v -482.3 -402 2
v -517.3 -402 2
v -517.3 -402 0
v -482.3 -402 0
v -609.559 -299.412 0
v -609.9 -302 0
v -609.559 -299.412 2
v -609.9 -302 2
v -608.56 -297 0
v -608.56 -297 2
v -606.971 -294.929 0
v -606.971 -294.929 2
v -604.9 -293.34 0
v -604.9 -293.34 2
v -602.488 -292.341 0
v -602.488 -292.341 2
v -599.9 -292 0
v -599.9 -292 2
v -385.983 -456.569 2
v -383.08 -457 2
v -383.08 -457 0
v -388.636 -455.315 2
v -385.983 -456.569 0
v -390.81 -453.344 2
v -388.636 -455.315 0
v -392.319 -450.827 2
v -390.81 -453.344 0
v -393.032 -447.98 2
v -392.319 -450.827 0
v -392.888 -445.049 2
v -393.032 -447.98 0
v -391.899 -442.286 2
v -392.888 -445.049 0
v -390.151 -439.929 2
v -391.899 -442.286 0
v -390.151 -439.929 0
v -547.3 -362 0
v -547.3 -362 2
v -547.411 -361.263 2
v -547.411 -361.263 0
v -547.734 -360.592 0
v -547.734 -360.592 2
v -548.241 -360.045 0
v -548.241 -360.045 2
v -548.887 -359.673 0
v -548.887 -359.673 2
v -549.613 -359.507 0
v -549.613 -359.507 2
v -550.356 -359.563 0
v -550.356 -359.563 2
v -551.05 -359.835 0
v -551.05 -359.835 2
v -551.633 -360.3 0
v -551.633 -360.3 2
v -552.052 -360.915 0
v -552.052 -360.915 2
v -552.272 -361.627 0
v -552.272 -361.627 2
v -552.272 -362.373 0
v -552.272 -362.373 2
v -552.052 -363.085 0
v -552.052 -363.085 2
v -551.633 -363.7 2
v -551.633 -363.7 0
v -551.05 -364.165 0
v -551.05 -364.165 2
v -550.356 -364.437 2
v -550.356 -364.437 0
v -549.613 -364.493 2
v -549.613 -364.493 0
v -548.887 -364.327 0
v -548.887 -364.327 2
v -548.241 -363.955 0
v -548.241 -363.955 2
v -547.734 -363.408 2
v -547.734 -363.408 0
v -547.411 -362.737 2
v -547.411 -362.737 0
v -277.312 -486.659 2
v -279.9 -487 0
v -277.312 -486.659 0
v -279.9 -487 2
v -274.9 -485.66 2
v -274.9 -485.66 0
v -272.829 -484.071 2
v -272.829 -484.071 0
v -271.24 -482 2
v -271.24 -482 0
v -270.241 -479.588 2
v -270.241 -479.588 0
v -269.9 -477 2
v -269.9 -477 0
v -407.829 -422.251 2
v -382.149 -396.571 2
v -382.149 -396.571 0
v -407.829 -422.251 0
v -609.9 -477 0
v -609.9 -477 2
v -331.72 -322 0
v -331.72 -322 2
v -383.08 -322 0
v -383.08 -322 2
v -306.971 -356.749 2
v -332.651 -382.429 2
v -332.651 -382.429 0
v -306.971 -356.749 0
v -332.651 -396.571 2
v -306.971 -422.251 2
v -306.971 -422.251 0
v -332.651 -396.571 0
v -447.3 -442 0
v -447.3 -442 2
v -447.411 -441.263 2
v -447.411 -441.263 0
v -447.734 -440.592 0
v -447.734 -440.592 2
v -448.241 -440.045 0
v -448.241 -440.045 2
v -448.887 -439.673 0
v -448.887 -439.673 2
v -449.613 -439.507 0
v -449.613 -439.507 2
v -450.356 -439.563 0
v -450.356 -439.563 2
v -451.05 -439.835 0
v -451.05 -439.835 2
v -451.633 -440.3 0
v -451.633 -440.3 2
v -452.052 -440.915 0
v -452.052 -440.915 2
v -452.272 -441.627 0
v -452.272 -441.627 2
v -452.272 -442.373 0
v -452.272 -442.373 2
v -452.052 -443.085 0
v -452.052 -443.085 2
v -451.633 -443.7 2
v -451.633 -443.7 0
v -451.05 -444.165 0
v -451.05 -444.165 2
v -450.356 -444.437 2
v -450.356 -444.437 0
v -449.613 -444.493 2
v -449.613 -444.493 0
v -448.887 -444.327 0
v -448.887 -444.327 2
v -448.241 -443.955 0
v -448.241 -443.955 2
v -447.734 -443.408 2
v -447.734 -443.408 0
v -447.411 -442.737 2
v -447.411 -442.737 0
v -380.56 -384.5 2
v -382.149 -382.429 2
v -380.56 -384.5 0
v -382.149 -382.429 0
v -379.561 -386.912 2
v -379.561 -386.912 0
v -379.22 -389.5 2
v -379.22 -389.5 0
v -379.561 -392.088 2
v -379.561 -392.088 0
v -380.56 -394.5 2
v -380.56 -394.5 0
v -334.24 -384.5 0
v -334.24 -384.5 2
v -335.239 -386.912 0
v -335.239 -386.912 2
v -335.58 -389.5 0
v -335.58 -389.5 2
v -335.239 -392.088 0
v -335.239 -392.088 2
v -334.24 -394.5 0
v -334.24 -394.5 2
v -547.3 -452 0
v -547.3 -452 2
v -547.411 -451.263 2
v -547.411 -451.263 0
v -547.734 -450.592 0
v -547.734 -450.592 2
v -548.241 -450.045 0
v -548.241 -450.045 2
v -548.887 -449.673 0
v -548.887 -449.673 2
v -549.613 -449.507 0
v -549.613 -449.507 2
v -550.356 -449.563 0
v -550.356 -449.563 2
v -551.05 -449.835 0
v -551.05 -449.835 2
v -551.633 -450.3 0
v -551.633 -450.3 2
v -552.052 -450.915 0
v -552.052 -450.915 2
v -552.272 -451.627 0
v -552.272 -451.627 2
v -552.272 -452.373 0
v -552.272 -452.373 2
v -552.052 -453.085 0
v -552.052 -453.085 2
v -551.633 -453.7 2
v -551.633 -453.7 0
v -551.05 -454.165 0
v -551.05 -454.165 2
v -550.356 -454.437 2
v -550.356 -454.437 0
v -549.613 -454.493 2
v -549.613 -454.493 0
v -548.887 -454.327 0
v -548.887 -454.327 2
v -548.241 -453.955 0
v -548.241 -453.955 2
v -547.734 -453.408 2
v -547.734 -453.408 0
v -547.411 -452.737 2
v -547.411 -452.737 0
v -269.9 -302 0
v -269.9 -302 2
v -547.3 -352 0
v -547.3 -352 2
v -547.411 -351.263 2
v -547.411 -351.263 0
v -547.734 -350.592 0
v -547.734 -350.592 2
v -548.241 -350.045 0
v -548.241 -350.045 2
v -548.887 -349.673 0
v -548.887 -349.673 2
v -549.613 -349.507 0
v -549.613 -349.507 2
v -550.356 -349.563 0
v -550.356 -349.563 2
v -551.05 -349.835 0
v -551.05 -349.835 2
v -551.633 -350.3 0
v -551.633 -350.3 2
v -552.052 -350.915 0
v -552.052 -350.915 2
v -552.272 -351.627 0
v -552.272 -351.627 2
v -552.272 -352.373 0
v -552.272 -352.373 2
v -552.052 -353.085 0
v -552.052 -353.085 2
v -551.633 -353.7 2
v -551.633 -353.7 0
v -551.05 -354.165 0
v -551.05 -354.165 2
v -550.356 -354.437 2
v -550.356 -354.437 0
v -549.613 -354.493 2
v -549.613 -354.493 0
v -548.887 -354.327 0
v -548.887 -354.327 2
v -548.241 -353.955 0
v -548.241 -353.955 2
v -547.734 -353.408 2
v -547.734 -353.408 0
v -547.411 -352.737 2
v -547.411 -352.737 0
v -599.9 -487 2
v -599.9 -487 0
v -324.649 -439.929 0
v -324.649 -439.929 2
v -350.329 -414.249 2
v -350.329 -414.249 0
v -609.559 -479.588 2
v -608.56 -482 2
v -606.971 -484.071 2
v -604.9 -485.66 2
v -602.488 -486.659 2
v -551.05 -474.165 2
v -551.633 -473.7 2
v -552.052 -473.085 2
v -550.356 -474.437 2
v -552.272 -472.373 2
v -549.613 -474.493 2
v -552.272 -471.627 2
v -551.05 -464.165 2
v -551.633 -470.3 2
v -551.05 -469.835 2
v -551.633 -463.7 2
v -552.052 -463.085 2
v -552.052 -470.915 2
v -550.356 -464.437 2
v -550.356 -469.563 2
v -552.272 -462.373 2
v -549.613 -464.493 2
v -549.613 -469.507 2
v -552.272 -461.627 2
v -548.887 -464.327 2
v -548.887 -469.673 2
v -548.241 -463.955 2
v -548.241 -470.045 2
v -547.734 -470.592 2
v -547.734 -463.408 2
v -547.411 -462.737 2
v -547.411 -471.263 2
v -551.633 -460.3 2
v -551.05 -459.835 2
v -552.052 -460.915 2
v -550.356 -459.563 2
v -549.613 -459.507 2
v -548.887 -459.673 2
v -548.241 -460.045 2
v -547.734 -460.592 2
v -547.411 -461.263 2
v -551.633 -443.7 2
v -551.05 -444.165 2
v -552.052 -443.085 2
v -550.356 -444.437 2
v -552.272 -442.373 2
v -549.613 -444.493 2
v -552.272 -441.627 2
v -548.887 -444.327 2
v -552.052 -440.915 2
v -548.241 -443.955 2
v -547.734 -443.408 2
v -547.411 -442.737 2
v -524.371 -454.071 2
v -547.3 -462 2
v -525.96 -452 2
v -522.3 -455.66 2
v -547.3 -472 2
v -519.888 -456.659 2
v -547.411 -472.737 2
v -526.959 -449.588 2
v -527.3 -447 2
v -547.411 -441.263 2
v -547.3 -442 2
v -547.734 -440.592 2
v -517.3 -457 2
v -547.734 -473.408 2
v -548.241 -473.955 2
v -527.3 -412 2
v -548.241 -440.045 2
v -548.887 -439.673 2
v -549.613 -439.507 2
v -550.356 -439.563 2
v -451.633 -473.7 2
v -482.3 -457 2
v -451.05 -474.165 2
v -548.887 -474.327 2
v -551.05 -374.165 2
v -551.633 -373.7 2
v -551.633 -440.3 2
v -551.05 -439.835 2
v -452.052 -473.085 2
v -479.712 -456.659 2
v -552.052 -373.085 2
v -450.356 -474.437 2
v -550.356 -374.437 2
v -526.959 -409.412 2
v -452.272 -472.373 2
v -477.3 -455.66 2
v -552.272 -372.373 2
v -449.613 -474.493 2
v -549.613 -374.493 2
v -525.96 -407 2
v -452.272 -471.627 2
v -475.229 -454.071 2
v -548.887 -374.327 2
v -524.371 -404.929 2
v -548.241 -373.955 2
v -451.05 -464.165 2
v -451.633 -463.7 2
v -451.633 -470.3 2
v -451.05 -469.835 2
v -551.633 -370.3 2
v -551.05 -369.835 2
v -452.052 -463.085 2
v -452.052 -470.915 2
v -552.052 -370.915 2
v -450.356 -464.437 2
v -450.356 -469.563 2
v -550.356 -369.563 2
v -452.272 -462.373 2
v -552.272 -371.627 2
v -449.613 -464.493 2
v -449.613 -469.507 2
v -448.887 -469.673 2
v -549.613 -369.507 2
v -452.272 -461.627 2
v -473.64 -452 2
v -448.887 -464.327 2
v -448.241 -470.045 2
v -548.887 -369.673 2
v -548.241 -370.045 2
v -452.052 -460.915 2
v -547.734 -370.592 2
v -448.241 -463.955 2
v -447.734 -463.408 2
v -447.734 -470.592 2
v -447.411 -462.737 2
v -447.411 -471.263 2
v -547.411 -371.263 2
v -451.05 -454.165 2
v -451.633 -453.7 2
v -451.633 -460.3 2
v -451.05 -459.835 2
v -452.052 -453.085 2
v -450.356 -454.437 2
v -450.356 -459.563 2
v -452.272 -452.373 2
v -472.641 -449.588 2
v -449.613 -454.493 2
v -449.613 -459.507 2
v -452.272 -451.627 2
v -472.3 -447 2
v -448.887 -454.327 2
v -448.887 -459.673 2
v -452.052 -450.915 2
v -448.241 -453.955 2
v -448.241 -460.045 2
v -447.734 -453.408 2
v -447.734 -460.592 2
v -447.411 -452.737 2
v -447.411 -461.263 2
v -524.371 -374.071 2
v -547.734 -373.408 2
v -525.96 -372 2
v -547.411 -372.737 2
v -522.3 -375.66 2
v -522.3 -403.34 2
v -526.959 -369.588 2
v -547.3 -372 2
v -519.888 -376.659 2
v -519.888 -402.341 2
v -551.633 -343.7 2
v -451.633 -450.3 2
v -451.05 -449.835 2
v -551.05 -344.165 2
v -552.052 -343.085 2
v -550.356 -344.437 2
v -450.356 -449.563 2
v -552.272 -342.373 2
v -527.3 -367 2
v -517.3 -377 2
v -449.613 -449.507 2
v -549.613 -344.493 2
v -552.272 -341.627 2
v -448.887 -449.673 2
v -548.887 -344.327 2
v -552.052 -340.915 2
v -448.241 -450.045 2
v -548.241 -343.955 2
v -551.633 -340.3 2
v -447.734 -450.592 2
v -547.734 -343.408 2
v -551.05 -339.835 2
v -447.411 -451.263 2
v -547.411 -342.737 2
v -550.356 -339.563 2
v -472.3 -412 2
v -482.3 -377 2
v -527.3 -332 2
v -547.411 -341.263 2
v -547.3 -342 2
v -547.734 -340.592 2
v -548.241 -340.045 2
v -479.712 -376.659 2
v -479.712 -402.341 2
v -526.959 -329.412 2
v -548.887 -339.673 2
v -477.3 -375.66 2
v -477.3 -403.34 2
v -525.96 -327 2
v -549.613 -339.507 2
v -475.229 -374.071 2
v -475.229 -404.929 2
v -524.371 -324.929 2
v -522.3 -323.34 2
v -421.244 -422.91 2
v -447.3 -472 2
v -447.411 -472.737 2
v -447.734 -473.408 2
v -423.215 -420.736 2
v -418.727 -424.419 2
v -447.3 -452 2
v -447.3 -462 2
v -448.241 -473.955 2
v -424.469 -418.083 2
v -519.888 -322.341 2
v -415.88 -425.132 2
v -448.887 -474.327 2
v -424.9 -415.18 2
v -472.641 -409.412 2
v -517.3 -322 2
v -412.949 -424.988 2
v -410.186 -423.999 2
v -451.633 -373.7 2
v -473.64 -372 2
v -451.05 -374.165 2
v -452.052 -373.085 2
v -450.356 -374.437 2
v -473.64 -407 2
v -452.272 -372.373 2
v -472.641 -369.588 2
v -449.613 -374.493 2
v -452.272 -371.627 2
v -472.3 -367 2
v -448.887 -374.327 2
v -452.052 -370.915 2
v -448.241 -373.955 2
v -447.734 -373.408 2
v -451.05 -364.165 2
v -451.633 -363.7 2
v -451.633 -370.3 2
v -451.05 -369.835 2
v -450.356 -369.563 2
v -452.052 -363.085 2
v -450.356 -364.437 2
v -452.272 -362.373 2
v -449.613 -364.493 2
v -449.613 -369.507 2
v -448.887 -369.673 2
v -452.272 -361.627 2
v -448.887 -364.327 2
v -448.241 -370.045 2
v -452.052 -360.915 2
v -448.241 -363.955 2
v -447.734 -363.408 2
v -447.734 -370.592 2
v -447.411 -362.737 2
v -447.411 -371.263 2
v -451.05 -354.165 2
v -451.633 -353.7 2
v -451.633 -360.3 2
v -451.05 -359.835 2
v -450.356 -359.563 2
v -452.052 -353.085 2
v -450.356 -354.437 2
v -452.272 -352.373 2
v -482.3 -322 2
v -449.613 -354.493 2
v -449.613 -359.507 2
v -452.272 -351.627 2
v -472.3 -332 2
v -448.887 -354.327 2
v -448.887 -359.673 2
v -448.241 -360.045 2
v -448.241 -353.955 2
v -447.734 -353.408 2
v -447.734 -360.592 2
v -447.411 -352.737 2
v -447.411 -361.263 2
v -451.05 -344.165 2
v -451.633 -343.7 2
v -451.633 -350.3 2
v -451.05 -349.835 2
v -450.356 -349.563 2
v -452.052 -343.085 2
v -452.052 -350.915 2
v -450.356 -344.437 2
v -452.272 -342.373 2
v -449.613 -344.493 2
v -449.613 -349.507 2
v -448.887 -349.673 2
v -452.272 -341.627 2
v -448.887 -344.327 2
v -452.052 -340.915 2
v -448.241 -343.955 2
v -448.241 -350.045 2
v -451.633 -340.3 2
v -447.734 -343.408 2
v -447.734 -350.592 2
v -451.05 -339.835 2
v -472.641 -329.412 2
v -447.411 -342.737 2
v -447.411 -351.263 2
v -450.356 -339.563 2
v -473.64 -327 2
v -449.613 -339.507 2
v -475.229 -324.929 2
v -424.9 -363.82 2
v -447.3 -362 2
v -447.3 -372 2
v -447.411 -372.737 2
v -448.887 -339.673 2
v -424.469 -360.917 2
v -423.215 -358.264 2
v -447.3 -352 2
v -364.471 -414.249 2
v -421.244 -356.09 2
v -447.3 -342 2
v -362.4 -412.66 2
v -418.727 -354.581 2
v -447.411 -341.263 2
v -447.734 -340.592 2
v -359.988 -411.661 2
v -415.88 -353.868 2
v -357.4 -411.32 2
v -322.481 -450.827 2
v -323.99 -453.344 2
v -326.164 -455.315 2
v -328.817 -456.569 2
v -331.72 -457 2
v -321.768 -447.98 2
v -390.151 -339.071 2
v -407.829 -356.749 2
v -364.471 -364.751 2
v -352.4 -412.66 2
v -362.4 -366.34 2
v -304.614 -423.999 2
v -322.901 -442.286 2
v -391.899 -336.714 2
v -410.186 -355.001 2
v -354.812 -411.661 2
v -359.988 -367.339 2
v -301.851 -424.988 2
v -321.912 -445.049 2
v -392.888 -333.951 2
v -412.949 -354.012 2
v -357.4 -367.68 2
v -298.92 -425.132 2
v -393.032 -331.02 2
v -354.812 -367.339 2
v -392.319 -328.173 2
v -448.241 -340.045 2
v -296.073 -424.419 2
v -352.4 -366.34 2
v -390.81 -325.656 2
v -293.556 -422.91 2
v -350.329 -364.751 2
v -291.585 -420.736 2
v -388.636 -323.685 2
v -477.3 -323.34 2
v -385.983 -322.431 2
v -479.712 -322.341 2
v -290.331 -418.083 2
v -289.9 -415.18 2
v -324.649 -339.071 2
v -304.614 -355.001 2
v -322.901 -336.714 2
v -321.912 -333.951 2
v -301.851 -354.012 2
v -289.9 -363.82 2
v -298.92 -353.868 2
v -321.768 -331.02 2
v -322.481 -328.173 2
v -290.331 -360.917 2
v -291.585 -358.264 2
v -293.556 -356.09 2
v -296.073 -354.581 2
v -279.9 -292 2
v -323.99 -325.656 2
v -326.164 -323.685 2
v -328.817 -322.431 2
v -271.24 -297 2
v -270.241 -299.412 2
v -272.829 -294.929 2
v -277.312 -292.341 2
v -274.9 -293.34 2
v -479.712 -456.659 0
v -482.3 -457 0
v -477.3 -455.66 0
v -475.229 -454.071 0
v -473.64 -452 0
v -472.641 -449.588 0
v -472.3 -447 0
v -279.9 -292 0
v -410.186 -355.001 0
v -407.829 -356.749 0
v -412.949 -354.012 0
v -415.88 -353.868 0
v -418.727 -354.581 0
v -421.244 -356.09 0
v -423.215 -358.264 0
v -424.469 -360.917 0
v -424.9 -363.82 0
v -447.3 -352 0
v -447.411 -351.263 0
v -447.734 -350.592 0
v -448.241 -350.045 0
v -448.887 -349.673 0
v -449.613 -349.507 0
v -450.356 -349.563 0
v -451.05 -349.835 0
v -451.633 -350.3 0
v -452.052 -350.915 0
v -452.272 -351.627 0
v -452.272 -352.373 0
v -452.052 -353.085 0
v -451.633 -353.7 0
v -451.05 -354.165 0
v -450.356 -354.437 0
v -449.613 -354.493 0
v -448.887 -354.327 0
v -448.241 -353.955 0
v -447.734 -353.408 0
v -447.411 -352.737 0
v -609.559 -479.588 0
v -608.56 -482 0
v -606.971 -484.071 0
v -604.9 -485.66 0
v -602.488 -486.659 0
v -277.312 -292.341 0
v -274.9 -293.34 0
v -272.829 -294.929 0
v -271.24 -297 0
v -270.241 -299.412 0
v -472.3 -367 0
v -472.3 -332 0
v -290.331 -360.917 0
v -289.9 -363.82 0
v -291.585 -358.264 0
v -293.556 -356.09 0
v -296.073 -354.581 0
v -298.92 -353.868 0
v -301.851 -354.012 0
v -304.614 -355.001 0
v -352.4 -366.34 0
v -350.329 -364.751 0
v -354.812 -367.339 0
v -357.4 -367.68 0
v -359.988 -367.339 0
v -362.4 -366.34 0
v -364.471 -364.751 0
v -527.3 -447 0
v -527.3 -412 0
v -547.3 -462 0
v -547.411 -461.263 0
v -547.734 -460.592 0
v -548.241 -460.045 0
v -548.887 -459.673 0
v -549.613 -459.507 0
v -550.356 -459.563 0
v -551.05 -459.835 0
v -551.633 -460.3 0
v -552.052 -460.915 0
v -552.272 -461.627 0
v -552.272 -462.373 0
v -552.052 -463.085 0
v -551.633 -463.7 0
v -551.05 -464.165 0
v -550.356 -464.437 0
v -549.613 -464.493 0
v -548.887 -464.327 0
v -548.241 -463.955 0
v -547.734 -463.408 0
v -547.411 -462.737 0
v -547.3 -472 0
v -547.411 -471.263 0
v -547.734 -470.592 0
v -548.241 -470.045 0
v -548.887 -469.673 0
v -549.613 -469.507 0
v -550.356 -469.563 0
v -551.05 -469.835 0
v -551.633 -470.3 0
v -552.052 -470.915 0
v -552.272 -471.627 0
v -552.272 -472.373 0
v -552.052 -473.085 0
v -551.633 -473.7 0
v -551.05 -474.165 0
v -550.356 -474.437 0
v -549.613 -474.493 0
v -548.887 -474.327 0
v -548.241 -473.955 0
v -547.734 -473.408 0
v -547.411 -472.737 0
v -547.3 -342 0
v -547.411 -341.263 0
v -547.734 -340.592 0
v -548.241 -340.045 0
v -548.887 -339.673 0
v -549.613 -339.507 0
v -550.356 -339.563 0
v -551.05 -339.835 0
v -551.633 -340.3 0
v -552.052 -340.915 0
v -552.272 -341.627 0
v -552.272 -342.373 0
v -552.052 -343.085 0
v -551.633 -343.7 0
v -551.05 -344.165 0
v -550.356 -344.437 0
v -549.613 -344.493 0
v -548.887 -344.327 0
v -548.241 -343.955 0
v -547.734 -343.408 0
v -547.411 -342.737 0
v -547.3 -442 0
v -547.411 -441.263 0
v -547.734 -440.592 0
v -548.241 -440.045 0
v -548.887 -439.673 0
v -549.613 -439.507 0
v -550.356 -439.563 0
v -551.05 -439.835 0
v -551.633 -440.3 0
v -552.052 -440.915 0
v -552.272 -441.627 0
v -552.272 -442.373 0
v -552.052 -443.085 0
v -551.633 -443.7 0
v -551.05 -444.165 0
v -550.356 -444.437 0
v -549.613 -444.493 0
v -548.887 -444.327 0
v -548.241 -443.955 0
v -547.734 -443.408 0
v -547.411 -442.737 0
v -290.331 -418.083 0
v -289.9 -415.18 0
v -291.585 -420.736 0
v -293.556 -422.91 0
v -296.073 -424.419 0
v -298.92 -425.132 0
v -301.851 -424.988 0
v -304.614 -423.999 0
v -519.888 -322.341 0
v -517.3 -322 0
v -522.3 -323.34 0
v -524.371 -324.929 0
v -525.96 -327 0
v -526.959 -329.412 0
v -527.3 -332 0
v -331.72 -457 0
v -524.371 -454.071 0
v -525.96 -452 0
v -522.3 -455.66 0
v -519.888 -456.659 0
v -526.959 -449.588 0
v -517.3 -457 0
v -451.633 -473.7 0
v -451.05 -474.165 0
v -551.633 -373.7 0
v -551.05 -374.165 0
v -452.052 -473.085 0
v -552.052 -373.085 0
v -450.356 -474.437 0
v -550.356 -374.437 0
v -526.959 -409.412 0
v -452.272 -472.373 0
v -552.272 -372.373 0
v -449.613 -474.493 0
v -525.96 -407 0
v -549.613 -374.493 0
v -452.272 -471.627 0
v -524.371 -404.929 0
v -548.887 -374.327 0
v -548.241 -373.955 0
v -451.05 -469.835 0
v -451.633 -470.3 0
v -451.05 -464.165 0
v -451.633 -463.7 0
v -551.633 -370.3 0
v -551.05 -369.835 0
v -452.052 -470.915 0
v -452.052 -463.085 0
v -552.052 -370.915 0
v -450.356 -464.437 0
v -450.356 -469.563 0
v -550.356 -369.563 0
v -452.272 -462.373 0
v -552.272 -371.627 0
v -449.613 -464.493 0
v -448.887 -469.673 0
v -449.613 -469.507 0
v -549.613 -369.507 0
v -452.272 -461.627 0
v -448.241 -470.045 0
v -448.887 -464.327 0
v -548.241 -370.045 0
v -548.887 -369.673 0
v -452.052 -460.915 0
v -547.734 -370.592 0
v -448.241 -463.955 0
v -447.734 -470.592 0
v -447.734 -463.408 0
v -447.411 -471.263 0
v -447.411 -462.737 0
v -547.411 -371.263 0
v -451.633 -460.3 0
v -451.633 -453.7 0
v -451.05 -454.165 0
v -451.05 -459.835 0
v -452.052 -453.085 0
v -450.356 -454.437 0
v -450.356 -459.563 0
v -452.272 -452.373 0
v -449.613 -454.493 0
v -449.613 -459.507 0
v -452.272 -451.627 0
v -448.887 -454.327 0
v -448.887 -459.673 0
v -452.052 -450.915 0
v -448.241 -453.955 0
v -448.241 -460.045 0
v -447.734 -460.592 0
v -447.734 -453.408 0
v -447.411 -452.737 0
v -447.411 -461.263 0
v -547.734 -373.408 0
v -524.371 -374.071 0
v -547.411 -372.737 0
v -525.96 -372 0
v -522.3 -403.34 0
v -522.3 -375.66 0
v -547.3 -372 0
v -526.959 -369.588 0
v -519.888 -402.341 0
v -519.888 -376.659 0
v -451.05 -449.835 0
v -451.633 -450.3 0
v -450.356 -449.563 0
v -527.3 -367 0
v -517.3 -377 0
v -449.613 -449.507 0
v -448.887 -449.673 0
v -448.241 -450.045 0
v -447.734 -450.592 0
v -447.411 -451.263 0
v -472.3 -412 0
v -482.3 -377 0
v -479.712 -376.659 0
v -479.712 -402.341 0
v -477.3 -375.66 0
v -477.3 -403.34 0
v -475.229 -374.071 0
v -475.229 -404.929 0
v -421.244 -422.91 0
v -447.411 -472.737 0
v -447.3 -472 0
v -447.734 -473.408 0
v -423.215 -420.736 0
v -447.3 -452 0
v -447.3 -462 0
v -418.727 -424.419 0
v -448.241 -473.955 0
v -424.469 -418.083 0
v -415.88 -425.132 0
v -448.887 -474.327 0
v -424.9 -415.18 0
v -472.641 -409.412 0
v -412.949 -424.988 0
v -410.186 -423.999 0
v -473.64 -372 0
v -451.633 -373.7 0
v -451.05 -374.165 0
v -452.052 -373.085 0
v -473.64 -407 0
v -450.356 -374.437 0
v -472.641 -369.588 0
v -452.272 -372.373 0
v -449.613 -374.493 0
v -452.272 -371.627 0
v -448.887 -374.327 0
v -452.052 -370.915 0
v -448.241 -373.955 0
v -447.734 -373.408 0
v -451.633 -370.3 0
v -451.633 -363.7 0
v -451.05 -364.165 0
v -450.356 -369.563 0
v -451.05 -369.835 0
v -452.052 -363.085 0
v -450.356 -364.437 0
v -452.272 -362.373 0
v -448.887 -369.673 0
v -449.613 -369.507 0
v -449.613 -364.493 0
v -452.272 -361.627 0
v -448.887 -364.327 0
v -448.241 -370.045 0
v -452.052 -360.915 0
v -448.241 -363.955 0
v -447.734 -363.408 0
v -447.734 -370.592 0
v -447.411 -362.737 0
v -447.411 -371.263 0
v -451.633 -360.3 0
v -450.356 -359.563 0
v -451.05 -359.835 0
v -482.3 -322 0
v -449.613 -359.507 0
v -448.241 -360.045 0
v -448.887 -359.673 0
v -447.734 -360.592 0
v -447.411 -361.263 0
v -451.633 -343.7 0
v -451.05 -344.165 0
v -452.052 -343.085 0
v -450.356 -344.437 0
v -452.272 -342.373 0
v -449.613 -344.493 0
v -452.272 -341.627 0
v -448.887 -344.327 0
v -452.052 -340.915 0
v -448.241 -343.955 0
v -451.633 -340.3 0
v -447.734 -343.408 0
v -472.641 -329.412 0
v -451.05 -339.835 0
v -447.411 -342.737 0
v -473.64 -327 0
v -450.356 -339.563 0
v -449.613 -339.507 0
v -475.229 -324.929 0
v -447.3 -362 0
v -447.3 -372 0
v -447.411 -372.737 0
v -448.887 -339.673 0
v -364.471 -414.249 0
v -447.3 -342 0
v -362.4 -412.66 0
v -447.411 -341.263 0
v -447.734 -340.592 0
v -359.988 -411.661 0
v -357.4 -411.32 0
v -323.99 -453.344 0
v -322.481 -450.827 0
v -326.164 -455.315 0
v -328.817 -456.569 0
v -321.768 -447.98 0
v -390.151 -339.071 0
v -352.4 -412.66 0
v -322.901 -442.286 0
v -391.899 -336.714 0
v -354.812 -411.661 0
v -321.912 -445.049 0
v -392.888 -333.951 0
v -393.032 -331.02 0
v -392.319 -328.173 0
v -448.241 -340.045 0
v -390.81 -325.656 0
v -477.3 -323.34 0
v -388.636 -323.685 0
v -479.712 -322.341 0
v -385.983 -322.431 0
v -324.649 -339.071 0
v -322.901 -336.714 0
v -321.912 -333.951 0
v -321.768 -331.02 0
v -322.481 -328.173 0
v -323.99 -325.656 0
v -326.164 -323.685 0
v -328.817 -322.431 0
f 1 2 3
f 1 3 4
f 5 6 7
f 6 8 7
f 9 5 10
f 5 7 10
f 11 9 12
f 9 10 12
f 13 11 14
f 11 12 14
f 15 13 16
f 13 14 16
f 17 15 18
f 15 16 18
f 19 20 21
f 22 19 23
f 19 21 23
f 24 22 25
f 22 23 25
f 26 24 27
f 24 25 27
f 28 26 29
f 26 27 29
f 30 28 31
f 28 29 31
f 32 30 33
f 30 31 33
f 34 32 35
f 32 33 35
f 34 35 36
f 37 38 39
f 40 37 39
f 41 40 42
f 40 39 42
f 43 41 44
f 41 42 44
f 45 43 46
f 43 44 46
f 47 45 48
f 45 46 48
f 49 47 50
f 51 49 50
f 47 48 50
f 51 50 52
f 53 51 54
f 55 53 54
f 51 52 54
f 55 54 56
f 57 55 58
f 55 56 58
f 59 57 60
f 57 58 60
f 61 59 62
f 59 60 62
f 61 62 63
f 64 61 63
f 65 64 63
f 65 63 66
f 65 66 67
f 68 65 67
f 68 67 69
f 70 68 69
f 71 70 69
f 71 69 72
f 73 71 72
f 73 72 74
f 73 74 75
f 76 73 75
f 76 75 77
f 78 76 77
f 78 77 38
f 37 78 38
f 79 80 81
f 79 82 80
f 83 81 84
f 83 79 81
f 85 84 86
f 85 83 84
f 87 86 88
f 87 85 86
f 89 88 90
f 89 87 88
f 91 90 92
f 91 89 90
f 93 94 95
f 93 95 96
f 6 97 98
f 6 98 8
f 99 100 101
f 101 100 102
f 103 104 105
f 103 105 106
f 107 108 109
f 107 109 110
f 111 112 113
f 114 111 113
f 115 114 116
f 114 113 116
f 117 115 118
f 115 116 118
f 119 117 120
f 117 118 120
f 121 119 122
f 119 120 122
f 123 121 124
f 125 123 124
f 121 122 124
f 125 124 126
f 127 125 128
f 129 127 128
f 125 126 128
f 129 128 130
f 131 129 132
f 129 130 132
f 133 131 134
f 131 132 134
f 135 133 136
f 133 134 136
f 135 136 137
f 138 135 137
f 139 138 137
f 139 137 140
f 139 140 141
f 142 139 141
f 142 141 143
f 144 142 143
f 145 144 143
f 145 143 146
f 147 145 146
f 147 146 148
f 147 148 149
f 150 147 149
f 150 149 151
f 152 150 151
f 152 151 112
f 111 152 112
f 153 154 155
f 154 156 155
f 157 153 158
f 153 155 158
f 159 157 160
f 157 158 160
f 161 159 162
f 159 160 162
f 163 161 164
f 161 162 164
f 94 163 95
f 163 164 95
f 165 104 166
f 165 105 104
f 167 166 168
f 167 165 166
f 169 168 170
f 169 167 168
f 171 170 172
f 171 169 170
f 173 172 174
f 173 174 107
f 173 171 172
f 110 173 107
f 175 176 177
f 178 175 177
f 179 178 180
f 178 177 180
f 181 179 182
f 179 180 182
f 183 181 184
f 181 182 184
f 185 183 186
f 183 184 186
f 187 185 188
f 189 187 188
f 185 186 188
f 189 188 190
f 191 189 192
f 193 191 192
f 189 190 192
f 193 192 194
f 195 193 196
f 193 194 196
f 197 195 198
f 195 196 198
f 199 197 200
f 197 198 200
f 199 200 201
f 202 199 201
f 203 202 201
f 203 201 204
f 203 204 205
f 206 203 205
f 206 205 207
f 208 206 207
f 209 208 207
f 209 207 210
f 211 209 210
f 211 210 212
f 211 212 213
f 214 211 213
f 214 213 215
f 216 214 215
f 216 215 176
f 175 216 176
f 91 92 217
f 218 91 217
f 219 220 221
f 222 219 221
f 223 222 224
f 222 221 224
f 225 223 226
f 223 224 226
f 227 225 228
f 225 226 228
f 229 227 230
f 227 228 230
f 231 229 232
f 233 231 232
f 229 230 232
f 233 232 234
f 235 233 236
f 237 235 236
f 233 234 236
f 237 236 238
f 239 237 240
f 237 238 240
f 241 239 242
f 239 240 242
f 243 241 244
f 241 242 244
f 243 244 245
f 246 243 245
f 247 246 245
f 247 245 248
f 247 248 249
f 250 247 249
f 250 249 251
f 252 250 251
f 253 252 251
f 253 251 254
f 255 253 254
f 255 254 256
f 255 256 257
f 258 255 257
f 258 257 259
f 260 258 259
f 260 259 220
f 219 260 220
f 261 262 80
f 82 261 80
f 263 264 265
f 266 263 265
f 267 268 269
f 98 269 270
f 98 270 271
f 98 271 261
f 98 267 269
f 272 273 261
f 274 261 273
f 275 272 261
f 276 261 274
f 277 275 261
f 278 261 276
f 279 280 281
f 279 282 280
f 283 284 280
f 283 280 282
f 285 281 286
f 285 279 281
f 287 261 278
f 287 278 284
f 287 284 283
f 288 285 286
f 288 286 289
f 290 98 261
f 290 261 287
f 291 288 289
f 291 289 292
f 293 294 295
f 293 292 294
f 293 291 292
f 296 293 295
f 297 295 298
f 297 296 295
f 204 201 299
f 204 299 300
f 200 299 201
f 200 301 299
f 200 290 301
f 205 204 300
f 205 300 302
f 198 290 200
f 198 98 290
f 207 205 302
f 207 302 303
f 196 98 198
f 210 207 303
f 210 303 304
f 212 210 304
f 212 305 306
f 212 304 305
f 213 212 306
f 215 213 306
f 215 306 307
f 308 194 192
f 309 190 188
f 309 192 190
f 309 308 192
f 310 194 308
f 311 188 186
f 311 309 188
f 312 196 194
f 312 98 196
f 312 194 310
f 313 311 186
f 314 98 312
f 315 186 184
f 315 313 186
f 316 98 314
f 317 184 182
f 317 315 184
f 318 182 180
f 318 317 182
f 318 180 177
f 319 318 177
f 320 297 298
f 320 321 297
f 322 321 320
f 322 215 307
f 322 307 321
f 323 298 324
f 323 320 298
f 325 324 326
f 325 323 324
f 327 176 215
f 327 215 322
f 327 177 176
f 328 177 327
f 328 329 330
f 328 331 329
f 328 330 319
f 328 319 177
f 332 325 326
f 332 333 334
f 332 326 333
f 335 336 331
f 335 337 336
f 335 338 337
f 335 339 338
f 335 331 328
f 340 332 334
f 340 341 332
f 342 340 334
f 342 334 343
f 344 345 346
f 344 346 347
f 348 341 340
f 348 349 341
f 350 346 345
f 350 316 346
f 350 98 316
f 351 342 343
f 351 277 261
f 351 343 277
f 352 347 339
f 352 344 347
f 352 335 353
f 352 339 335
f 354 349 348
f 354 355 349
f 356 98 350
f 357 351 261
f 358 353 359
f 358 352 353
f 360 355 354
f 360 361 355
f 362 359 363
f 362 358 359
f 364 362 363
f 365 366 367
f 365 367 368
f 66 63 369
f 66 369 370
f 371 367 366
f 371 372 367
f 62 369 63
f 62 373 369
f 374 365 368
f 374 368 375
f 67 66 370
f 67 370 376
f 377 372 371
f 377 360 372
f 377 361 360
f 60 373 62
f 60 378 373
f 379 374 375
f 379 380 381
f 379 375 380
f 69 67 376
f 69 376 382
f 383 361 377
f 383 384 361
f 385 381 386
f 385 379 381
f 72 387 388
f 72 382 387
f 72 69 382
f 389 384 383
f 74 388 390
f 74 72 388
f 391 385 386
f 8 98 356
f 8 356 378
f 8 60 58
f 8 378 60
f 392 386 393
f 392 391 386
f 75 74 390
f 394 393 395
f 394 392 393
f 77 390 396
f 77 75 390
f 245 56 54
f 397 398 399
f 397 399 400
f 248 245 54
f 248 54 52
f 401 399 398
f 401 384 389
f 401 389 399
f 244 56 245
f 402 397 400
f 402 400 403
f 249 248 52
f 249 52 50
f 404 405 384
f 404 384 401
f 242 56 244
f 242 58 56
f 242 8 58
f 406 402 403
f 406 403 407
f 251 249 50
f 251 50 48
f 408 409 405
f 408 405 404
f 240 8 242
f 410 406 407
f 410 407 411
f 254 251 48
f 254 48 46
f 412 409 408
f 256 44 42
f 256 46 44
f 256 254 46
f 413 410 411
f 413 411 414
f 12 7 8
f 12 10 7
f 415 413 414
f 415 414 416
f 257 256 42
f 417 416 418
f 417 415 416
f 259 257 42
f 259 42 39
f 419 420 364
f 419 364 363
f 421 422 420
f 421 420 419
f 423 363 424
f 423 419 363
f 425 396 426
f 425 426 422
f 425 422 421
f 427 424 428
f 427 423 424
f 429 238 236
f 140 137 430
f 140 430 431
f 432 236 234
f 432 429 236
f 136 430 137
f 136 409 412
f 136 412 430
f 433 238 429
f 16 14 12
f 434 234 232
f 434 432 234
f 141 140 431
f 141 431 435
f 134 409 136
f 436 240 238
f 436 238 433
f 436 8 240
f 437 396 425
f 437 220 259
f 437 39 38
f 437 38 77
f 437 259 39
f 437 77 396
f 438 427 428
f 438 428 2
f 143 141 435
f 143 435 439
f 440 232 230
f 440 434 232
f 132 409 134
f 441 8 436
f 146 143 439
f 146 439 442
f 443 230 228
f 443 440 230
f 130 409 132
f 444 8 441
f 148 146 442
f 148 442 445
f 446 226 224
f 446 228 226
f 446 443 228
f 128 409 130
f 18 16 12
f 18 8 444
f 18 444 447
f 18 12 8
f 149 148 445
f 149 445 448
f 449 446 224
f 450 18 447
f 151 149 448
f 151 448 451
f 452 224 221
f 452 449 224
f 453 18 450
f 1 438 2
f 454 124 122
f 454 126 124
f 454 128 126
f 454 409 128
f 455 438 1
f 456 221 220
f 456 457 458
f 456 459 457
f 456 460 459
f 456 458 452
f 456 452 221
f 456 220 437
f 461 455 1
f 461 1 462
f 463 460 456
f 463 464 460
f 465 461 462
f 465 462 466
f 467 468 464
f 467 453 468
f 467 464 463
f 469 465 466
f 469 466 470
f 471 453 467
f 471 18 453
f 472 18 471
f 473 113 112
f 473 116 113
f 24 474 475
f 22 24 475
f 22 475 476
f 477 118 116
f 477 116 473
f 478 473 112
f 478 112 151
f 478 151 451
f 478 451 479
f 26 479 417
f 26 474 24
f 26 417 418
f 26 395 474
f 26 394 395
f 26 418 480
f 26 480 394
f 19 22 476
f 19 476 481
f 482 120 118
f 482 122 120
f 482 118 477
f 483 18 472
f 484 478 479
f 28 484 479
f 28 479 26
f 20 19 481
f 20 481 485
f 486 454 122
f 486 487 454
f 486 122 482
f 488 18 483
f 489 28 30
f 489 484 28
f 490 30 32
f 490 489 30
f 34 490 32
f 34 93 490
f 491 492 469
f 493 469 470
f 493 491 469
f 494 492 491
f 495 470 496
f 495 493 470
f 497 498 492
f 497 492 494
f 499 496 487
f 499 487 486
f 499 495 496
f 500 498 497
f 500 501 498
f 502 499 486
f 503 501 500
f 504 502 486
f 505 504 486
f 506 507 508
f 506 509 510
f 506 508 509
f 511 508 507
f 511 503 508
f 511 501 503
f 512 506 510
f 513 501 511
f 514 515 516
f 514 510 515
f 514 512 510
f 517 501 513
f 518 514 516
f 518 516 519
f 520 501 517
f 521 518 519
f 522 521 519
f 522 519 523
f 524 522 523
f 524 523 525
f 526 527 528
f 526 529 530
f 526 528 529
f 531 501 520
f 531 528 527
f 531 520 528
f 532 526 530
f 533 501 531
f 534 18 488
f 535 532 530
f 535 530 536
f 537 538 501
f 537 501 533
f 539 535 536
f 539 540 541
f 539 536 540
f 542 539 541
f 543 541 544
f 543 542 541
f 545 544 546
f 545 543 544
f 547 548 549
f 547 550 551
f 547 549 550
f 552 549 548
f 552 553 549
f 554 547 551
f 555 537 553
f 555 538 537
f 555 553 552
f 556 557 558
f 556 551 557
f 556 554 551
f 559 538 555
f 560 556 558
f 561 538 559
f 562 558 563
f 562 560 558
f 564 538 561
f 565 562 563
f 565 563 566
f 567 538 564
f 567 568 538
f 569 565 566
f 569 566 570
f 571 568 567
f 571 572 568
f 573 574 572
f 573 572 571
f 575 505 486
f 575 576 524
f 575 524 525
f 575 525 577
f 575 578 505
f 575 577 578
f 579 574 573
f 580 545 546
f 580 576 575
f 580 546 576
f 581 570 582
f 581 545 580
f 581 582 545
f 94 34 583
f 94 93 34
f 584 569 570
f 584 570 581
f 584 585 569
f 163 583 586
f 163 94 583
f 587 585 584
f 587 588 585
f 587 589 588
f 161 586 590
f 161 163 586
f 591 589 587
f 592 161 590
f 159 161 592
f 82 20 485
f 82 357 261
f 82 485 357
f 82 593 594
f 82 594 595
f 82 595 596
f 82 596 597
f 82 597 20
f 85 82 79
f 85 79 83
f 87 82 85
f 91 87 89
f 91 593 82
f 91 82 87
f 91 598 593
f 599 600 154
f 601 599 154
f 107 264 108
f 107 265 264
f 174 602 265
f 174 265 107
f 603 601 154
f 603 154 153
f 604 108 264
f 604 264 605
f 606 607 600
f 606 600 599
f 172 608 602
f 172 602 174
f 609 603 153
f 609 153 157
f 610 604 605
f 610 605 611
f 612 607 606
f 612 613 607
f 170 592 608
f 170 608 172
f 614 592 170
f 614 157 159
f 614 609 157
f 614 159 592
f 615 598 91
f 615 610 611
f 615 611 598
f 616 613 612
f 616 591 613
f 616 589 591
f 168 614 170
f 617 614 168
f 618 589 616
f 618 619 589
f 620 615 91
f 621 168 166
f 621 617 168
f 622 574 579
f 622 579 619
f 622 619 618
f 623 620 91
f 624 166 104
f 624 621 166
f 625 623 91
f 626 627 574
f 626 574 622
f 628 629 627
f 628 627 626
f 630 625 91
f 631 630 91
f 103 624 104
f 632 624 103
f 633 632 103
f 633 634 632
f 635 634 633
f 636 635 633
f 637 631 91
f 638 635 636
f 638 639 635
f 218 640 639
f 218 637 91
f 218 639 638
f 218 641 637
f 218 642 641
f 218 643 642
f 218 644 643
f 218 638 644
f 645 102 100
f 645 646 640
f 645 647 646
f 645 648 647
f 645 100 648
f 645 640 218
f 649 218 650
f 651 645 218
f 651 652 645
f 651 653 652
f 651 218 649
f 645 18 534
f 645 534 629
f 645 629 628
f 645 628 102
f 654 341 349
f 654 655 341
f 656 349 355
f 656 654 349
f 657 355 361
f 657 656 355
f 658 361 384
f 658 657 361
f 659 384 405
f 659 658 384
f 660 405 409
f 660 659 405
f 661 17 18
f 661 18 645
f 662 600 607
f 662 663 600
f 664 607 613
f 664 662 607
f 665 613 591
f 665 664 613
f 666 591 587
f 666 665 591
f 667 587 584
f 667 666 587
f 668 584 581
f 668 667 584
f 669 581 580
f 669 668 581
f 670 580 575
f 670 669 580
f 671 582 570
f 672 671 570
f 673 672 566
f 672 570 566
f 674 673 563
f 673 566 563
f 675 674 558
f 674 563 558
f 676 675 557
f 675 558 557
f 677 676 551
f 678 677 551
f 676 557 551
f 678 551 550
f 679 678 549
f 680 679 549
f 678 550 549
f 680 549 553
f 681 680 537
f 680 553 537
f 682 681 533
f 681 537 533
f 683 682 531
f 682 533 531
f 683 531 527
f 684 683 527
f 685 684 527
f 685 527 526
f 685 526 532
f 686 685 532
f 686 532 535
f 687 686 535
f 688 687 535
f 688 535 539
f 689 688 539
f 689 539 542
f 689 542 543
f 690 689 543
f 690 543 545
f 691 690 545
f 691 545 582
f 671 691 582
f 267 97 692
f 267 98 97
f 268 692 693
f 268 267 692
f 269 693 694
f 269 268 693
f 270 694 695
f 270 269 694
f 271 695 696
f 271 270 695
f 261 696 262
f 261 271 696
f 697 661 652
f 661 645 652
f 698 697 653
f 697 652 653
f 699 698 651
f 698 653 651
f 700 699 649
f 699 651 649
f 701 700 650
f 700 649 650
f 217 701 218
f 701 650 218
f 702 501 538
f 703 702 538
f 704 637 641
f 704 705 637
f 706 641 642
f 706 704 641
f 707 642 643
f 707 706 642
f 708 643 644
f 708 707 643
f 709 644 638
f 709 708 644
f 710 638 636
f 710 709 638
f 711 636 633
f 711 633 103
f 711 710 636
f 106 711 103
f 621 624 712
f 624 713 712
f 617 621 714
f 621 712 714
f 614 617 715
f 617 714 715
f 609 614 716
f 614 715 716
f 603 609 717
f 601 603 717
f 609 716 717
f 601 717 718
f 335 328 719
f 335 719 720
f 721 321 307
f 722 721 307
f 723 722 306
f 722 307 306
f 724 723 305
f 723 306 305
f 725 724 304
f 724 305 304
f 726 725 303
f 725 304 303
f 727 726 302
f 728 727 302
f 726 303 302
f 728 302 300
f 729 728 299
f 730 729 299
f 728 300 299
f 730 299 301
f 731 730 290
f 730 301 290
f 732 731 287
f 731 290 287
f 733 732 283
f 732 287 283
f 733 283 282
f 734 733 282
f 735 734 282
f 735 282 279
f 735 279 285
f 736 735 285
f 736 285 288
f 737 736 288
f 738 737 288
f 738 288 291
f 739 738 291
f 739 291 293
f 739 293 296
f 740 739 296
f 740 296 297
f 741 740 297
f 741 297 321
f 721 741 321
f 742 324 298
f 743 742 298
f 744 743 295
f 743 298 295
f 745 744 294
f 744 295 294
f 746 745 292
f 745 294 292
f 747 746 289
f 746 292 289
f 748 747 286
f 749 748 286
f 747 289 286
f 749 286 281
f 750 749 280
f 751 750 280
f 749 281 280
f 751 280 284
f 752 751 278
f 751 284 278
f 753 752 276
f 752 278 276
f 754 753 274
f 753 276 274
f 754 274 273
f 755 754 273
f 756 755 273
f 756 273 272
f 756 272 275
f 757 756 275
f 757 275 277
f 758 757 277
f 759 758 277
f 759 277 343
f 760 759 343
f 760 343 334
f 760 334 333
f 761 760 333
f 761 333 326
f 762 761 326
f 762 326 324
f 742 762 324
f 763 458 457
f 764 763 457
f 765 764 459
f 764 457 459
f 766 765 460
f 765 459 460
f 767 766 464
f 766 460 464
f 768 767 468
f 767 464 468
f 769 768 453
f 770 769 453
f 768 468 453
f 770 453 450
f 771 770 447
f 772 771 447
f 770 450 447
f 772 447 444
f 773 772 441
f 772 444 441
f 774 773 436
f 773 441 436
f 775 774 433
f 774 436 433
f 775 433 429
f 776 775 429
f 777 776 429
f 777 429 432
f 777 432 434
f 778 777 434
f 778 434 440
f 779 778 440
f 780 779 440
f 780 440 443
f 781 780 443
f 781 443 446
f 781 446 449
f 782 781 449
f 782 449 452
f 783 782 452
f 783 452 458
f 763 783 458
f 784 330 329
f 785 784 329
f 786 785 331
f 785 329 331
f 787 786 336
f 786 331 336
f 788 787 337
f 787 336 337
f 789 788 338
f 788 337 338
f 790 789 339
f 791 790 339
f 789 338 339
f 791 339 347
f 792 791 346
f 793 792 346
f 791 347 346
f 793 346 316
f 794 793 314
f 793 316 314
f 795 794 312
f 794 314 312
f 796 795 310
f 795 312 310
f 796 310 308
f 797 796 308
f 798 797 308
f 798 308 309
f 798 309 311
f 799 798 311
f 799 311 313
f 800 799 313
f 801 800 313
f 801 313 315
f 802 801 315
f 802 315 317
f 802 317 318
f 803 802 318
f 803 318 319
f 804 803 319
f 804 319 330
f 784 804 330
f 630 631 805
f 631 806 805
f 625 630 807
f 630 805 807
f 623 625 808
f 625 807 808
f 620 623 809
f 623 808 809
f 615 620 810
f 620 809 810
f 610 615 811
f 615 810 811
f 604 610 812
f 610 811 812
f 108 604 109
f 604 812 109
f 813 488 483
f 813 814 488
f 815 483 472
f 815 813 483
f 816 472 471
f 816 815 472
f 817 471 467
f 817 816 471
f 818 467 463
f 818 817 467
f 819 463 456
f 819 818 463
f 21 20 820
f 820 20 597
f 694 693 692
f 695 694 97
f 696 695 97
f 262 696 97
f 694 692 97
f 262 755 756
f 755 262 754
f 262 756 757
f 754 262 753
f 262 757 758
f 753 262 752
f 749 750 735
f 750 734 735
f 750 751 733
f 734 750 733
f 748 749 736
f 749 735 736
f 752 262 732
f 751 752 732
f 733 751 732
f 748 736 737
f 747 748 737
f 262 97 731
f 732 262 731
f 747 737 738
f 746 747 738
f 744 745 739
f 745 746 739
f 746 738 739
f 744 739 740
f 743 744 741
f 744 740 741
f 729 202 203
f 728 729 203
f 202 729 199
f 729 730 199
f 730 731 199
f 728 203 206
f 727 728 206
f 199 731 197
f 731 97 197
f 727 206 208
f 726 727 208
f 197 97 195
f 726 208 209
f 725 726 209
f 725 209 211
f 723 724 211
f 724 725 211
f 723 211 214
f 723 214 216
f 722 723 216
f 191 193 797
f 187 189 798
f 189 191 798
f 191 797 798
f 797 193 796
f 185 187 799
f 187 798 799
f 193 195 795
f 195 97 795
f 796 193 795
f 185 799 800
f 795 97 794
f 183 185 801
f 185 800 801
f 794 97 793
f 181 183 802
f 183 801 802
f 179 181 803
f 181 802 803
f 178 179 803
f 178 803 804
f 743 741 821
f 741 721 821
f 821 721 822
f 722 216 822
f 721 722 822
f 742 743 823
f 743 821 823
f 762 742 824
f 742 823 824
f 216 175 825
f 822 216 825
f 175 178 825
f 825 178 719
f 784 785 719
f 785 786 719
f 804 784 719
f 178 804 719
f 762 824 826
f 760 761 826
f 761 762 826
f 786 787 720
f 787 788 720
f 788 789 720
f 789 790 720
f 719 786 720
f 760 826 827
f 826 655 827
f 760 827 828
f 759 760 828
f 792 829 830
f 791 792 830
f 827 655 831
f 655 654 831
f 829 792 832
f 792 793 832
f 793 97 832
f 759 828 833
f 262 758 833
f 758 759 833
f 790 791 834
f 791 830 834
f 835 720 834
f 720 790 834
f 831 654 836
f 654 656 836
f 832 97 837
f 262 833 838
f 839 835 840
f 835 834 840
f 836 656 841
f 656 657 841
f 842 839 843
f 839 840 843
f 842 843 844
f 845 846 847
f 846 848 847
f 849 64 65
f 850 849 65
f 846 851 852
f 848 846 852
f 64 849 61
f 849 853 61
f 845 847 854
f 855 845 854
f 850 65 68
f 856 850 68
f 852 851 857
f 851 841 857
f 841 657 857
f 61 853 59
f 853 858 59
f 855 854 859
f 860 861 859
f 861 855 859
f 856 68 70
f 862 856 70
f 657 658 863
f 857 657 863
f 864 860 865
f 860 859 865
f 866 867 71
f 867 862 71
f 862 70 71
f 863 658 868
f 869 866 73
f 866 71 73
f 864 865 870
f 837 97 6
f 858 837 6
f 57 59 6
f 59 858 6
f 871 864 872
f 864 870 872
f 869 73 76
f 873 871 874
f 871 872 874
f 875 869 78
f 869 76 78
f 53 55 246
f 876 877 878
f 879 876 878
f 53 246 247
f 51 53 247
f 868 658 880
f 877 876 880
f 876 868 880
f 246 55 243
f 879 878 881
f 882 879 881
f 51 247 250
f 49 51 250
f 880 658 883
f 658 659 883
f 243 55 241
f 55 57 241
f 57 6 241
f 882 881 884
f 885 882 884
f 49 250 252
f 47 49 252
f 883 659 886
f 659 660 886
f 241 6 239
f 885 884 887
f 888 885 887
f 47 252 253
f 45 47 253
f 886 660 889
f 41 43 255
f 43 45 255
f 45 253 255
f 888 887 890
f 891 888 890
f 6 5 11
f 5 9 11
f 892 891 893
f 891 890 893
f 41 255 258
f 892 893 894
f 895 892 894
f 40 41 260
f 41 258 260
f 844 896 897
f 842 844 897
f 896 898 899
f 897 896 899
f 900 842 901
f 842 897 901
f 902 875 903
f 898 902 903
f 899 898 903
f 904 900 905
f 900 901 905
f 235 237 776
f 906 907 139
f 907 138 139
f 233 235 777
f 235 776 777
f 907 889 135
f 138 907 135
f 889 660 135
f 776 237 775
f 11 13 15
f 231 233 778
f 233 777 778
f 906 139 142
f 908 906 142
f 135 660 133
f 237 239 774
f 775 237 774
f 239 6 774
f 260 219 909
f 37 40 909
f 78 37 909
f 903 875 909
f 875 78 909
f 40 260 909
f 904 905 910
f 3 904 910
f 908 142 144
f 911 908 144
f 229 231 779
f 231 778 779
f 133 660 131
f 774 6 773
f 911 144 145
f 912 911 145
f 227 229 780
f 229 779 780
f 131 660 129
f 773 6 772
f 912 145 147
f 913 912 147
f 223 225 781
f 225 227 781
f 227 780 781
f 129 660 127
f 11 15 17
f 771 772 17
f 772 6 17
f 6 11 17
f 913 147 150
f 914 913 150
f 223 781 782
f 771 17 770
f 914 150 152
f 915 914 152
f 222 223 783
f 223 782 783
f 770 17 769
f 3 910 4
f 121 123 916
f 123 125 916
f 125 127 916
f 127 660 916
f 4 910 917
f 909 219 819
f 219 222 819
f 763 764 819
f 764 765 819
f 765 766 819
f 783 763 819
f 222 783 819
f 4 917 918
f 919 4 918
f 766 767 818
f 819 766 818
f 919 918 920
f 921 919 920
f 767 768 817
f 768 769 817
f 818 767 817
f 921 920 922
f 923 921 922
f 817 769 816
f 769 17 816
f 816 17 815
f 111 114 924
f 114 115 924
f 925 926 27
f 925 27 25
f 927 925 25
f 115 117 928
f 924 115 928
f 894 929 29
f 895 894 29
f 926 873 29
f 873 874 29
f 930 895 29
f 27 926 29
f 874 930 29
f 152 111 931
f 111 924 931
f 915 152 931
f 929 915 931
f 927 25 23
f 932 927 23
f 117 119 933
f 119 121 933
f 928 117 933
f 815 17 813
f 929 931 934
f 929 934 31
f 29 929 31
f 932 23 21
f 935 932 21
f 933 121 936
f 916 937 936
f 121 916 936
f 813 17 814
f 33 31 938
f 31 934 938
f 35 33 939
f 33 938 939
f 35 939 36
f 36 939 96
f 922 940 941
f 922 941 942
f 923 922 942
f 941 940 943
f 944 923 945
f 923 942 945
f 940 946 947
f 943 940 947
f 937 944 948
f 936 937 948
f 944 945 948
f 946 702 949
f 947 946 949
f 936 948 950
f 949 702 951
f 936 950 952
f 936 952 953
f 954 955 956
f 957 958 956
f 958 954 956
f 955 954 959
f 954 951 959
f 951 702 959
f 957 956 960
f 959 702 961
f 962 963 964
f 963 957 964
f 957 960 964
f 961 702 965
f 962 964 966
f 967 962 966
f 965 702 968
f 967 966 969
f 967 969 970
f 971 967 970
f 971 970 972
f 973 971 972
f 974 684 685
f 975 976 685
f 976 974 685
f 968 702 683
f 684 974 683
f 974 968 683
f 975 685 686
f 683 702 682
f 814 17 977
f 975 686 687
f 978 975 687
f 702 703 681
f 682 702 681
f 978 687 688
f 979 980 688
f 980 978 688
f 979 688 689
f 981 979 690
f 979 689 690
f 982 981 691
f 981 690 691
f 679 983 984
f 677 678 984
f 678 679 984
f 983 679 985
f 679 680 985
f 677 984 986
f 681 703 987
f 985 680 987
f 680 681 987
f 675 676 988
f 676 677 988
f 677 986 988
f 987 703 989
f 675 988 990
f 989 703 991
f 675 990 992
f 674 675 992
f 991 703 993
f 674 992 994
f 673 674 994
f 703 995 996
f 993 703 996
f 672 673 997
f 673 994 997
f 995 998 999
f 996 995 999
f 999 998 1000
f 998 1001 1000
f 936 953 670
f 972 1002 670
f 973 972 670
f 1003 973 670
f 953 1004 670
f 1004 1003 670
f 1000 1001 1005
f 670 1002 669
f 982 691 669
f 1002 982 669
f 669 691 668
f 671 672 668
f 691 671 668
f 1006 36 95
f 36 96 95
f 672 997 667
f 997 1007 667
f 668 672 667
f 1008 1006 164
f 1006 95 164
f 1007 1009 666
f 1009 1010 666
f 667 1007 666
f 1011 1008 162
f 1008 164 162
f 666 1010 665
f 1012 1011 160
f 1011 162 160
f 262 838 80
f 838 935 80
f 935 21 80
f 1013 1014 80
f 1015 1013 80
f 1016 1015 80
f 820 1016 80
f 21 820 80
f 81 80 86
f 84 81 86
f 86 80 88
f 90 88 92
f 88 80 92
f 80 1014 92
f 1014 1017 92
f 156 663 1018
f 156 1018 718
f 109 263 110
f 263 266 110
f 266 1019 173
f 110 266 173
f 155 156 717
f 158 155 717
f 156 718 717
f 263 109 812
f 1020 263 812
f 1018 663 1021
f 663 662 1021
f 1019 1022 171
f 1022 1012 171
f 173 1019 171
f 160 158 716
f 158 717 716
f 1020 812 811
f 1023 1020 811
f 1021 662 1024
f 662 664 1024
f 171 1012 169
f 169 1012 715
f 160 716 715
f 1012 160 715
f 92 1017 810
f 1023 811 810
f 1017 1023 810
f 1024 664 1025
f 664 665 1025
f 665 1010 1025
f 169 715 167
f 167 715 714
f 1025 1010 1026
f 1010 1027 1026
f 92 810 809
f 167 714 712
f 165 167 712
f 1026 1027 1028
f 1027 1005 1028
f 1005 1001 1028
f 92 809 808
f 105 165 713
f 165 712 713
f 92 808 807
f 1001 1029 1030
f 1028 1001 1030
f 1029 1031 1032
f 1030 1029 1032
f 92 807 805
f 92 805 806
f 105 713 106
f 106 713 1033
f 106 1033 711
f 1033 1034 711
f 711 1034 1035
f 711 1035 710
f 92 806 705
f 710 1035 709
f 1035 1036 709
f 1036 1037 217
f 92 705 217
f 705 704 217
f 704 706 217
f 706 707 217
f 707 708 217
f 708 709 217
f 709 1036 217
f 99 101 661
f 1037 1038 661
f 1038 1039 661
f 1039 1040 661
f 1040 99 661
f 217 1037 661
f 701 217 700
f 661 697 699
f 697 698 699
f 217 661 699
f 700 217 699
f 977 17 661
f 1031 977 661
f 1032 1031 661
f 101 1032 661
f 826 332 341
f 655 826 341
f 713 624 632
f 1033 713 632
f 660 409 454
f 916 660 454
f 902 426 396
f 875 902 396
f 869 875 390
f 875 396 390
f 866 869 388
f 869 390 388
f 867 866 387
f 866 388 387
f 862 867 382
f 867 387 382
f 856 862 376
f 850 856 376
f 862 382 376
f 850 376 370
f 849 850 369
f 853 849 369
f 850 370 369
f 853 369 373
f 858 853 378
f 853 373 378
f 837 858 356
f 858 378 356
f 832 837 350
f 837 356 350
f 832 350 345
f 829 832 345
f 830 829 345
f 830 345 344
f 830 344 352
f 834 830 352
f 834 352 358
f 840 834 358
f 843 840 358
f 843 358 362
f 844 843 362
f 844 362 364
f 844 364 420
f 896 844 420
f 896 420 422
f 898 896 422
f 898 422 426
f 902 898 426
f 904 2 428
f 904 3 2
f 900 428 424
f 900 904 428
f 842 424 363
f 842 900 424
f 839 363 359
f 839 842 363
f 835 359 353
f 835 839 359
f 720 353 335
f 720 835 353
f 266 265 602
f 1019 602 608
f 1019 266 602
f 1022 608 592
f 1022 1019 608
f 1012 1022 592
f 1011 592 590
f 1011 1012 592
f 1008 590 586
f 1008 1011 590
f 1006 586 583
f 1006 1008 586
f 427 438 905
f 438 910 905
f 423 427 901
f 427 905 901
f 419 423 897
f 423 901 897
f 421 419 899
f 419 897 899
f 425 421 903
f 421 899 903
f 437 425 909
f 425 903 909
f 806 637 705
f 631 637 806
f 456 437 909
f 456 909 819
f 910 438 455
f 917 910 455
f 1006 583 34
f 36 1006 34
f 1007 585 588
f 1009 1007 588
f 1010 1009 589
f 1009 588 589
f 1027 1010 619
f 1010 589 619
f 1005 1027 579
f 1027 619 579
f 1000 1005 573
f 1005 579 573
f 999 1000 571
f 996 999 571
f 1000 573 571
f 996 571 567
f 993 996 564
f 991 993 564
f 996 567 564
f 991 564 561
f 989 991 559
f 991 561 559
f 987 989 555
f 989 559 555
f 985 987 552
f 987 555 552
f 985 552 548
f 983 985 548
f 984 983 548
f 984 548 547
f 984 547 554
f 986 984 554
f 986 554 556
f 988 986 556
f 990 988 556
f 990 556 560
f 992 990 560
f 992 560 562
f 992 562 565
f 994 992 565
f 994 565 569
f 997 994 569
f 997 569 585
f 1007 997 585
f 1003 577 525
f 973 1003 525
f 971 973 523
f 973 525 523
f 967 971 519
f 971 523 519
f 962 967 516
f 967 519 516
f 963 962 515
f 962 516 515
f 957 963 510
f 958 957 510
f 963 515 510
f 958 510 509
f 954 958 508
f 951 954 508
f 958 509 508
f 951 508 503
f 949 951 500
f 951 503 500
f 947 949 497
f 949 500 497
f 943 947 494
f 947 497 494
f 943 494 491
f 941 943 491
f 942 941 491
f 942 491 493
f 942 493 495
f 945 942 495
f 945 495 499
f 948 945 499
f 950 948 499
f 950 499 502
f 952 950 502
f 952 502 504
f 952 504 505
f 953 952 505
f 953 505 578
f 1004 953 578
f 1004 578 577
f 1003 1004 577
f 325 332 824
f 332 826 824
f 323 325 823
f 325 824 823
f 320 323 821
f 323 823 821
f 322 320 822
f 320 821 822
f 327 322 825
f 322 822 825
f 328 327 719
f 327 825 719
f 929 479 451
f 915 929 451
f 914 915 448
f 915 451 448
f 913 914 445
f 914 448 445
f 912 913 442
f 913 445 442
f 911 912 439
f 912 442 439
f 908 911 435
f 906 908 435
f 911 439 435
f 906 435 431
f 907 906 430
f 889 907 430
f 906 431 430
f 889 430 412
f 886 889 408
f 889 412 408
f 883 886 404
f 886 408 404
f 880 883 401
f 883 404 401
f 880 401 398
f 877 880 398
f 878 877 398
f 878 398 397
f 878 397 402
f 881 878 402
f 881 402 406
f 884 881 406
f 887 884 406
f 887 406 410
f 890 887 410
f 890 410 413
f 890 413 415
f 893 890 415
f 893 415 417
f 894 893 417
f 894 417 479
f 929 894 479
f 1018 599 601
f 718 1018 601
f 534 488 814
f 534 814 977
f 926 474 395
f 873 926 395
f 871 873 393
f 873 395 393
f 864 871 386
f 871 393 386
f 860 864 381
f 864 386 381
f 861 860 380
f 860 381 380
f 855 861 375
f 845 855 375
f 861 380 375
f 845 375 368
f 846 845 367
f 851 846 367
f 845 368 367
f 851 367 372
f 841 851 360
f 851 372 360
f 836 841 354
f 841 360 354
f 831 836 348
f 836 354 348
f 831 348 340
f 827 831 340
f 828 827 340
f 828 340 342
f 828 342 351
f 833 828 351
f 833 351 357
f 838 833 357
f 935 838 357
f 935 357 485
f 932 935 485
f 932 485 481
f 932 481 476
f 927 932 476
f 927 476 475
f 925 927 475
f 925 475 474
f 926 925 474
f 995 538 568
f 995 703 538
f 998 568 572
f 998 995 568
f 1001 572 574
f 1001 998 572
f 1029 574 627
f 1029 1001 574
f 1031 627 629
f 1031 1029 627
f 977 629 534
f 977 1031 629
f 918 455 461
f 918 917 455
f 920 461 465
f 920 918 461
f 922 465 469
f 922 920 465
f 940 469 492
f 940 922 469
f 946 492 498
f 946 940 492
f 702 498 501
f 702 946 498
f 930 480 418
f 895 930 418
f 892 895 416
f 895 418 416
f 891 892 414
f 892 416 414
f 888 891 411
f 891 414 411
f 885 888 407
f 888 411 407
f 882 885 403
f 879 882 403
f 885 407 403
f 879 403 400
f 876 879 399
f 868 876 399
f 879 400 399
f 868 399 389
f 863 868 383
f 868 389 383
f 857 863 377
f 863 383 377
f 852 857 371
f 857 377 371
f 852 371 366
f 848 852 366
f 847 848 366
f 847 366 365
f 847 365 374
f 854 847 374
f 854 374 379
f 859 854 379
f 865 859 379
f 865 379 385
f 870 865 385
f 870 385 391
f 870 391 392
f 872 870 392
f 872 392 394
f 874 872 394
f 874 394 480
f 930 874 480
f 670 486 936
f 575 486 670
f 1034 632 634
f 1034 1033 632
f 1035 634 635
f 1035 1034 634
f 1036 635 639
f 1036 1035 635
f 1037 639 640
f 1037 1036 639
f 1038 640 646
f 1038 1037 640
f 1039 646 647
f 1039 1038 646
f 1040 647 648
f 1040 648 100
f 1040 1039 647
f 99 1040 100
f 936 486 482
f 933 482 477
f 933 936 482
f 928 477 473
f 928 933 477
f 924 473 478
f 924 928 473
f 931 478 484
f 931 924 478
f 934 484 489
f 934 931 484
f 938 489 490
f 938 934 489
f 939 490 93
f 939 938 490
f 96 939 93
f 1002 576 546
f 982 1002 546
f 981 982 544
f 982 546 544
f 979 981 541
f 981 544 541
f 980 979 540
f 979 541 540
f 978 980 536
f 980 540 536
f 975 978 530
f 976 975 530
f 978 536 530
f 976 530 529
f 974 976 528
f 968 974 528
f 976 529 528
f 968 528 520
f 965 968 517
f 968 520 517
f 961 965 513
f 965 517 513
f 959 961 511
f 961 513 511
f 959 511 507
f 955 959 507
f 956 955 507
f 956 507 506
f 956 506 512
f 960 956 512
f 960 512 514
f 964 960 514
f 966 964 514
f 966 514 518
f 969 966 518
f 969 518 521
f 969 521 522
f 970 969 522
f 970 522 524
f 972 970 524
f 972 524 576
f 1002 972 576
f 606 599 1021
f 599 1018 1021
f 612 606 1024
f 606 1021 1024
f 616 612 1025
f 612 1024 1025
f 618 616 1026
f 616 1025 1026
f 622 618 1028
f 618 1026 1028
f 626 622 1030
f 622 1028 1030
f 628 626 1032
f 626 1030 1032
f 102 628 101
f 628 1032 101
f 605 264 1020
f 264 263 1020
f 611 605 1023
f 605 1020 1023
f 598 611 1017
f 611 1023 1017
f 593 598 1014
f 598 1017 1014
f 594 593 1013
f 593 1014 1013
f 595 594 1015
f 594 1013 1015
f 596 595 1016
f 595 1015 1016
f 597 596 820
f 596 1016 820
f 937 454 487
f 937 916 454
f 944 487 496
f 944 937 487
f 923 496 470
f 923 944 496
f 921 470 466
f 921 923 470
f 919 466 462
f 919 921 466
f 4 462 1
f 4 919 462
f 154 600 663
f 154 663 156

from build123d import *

# Parameters (mm, degrees)
SKETCH1_W           = 340
SKETCH1_H           = 195
BOSS_EXTRUDE1_DEPTH = 2
SKETCH2_R           = 2.5
CUT_EXTRUDE1_DEPTH  = 3
LPATTERN1_COUNT     = 2
LPATTERN1_PITCH     = 10
LPATTERN1_COL_COUNT = 3
LPATTERN1_COL_PITCH = 10
CUT_EXTRUDE2_DEPTH  = 3
SKETCH4_W           = 55
SKETCH4_H           = 55
CUT_EXTRUDE3_DEPTH  = 3
FILLET1_R           = 10
FILLET2_R           = 10


with BuildPart() as part:
    # Sketch1 → Boss-Extrude1 (new body)
    with BuildSketch(Plane.XY):
        with Locations((-439.9, -389.5)):
            Rectangle(SKETCH1_W, SKETCH1_H)
    extrude(amount=BOSS_EXTRUDE1_DEPTH)

    # Sketch2 → Cut-Extrude1 (cut, through all)
    with BuildSketch(Plane.XY.offset(2)):
        with Locations((-449.8, -362)):
            Circle(SKETCH2_R)
        with Locations((-449.8, -462)):
            Circle(SKETCH2_R)
        with Locations((-549.8, -462)):
            Circle(SKETCH2_R)
        with Locations((-549.8, -362)):
            Circle(SKETCH2_R)
    cut_extrude1 = extrude(amount=-CUT_EXTRUDE1_DEPTH, mode=Mode.SUBTRACT)

    # LPattern1: Cut-Extrude1 ×2
    with Locations(*[(0, -i * LPATTERN1_PITCH, 0) for i in range(1, LPATTERN1_COUNT)]):
        add(cut_extrude1, mode=Mode.SUBTRACT)

    # LPattern1 col: Cut-Extrude1 ×3
    with Locations(*[(0, i * LPATTERN1_COL_PITCH, 0) for i in range(1, LPATTERN1_COL_COUNT)]):
        add(cut_extrude1, mode=Mode.SUBTRACT)

    # Sketch3 → Cut-Extrude2 (cut, through all)
    with BuildSketch(Plane.XY.offset(2)):
        Polygon((-307.57766953, -457), (-357.4, -407.17766953), (-407.22233047, -457), align=None)
        Polygon((-289.9, -439.32233047), (-339.72233047, -389.5), (-289.9, -339.67766953), align=None)
        Polygon((-375.07766953, -389.5), (-424.9, -439.32233047), (-424.9, -339.67766953), align=None)
        Polygon((-357.4, -371.82233047), (-307.57766953, -322), (-407.22233047, -322), align=None)
    extrude(amount=-CUT_EXTRUDE2_DEPTH, mode=Mode.SUBTRACT)

    # Sketch4 → Cut-Extrude3 (cut, through all)
    with BuildSketch(Plane.XY.offset(2)):
        with Locations((-499.8, -429.5)):
            Rectangle(SKETCH4_W, SKETCH4_H)
        with Locations((-499.8, -349.5)):
            Rectangle(SKETCH4_W, SKETCH4_H)
    extrude(amount=-CUT_EXTRUDE3_DEPTH, mode=Mode.SUBTRACT)

    # Fillet1
    fillet1_edges = [part.edges().sort_by_distance(p)[0] for p in [
        (-289.9, -339.67766953, 1),
        (-289.9, -439.32233047, 1),
        (-339.72233047, -389.5, 1),
        (-424.9, -339.67766953, 1),
        (-375.07766953, -389.5, 1),
        (-424.9, -439.32233047, 1),
        (-357.4, -371.82233047, 1),
        (-407.22233047, -322, 1),
        (-307.57766953, -322, 1),
        (-307.57766953, -457, 1),
        (-407.22233047, -457, 1),
        (-357.4, -407.17766953, 1),
        (-472.3, -402, 1),
        (-472.3, -457, 1),
        (-527.3, -457, 1),
        (-527.3, -402, 1),
        (-472.3, -322, 1),
        (-472.3, -377, 1),
        (-527.3, -377, 1),
        (-527.3, -322, 1),
    ]]
    fillet(fillet1_edges, radius=FILLET1_R)

    # Fillet2
    fillet2_edges = [part.edges().sort_by_distance(p)[0] for p in [
        (-269.9, -487, 1),
        (-609.9, -487, 1),
        (-609.9, -292, 1),
        (-269.9, -292, 1),
    ]]
    fillet(fillet2_edges, radius=FILLET2_R)


solid = part.part
